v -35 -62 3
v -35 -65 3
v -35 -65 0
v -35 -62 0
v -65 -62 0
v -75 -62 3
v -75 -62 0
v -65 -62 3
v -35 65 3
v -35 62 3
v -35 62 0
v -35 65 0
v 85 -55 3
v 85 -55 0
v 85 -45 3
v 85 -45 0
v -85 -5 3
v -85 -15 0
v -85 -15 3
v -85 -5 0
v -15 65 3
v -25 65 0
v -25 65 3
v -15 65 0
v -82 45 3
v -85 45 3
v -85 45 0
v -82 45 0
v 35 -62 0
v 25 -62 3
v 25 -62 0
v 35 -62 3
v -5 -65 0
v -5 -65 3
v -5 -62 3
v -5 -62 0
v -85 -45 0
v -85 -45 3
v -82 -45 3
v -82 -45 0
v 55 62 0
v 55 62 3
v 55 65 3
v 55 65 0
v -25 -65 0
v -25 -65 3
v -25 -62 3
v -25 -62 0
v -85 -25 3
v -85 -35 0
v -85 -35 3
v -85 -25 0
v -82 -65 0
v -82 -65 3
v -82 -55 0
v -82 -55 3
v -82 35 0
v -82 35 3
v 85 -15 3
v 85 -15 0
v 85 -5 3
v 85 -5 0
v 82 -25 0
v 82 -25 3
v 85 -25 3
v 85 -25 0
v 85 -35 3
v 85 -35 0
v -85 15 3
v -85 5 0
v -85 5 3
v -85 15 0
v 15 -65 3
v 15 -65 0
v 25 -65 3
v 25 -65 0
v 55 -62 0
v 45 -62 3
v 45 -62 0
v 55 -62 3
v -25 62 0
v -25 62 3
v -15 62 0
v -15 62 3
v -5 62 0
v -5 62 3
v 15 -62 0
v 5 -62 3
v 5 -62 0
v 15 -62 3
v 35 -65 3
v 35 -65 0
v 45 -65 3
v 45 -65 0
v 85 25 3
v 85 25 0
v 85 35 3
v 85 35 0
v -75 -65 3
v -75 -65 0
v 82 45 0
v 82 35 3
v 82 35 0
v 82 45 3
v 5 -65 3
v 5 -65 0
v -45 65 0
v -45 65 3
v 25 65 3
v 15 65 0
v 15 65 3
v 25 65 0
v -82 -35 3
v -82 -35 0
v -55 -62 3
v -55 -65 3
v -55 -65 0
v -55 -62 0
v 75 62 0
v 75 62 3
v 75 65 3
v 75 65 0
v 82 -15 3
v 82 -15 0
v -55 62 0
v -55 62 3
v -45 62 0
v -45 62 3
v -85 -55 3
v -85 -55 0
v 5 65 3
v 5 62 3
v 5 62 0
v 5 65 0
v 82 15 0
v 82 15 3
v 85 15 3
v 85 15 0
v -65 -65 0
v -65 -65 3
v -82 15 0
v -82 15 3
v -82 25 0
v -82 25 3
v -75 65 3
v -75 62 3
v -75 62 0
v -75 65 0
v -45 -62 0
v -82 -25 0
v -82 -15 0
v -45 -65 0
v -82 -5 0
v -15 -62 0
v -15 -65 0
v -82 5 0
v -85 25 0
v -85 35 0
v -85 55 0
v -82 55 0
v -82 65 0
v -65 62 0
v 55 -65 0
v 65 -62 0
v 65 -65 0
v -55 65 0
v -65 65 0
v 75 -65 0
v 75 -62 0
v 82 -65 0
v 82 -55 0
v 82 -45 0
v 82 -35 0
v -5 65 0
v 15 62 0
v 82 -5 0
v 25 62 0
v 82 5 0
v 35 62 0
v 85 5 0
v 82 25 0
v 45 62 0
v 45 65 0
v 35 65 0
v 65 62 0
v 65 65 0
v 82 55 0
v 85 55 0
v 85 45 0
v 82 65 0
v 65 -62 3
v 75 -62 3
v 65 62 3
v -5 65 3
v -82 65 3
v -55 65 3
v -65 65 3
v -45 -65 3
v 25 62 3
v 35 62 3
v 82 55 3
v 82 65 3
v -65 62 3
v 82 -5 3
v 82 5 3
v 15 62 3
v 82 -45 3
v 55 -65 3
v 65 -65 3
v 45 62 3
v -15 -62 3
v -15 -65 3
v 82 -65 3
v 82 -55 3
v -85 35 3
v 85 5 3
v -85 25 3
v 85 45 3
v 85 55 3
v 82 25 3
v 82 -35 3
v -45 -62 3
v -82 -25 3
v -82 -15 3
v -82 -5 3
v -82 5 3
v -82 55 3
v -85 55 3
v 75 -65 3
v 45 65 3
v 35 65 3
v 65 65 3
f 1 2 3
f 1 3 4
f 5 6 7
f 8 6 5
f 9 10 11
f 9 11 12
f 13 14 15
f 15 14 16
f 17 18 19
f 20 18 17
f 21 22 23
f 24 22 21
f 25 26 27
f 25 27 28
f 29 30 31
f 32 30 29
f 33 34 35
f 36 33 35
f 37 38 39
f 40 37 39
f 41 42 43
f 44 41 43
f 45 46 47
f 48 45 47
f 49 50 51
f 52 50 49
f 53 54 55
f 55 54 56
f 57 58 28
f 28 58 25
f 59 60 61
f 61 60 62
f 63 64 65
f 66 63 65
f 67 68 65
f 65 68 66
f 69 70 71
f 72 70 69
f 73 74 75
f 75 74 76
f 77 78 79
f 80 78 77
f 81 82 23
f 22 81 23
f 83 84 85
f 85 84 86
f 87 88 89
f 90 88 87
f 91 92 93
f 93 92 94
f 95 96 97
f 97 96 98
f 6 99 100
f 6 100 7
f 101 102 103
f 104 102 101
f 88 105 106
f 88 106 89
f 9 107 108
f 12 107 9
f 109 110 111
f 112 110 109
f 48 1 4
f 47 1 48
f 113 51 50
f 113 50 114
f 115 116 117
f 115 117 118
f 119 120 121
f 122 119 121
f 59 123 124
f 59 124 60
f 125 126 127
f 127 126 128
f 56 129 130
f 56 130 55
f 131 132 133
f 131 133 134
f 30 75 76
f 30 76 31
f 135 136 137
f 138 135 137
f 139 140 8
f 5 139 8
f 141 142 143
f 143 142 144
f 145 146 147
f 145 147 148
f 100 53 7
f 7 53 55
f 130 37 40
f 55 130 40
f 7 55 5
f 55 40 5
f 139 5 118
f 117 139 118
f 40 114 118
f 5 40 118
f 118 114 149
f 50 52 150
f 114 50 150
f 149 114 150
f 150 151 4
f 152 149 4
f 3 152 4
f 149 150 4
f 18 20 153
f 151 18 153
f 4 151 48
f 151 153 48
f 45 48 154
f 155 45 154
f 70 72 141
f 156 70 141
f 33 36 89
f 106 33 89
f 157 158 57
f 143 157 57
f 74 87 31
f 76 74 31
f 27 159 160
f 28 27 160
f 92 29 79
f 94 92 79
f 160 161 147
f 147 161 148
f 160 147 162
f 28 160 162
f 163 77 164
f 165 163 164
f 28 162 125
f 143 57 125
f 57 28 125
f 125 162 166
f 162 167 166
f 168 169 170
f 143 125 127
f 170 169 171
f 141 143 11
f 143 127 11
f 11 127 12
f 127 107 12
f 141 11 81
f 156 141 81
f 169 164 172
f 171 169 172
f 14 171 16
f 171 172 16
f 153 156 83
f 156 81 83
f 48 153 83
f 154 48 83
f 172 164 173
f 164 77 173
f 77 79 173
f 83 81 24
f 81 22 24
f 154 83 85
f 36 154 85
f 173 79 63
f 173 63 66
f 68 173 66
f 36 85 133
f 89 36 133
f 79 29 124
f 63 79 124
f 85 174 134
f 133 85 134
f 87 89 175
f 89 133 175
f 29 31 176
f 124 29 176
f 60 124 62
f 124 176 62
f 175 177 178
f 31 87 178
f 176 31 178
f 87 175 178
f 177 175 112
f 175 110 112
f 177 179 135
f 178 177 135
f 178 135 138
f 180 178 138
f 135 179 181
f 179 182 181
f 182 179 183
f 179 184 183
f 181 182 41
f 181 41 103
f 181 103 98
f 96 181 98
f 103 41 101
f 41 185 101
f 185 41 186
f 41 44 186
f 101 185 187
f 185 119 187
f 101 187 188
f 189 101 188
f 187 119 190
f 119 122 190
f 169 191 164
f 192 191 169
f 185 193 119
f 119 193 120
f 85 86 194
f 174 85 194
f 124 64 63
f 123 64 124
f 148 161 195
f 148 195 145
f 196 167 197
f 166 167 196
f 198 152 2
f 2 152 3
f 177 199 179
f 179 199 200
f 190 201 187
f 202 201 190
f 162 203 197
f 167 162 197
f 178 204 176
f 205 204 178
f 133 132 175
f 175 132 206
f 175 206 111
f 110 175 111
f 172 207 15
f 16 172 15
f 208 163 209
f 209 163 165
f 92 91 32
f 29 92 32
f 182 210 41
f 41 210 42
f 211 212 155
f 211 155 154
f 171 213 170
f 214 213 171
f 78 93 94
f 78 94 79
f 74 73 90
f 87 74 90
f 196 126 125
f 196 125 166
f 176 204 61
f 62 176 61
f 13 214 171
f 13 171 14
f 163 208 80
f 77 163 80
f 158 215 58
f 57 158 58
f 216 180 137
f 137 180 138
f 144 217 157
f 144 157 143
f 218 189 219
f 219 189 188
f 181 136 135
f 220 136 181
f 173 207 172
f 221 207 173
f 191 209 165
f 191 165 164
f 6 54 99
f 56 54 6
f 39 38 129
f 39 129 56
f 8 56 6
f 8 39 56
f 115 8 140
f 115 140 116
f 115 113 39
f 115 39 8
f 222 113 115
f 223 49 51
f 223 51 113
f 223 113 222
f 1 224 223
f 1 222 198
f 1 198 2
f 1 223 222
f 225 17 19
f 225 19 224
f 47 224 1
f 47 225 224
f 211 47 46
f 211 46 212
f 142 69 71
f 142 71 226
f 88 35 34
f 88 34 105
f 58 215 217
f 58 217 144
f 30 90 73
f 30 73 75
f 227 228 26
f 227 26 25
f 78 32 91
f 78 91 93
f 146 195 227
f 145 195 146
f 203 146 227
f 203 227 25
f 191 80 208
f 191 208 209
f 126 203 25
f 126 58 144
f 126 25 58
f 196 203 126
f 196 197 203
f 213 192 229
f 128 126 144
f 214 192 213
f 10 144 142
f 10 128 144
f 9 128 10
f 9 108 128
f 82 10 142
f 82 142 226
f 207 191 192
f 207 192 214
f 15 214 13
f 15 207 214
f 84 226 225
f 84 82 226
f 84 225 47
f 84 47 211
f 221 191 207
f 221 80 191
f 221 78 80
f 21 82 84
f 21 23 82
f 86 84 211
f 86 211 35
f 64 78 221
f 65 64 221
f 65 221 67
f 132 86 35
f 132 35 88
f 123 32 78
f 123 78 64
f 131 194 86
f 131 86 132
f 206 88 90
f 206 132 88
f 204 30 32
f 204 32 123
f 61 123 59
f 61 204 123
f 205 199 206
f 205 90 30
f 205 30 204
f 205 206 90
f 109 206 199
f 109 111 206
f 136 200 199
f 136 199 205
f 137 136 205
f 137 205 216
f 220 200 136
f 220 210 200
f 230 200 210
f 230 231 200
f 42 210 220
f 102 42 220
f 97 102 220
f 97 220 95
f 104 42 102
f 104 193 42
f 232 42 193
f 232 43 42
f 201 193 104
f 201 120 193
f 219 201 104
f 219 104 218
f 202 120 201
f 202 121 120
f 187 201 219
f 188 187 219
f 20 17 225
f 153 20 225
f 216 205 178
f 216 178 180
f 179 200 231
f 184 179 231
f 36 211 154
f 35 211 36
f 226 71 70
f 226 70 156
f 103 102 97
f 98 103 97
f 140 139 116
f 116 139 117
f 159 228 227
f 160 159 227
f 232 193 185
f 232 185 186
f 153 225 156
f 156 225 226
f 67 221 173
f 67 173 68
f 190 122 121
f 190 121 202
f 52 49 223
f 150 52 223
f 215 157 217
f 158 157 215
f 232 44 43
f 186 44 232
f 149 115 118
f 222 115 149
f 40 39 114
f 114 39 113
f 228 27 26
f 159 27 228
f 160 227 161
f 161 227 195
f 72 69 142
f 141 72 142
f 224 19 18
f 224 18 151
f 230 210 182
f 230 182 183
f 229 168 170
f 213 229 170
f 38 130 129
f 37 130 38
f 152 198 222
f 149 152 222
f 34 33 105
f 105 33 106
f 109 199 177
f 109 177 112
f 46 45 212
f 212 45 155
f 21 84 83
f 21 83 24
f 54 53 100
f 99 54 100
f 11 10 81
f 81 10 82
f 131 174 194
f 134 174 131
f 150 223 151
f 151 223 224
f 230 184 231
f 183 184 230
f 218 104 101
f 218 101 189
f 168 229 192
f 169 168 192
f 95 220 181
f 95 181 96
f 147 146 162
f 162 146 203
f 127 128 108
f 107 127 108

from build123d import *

# Parameters (mm, degrees)
F0_W     = 170
F0_H     = 130
F1_DEPTH = 3
F2_W     = 10
F2_H     = 3
F2_W_2   = 3
F2_H_2   = 10
F3_DEPTH = 3.001


with BuildPart() as f1:
    # F0 (on Top) → F1 (new body)
    with BuildSketch(Plane.XY):
        Rectangle(F0_W, F0_H)
    extrude(amount=F1_DEPTH)

    # F2 (on face) → F3 (cut, through all)
    with BuildSketch(Plane.XY.offset(3)):
        with Locations((-70, -63.5)):
            Rectangle(F2_W, F2_H)
        with Locations((-50, -63.5)):
            Rectangle(F2_W, F2_H)
        with Locations((-30, -63.5)):
            Rectangle(F2_W, F2_H)
        with Locations((-10, -63.5)):
            Rectangle(F2_W, F2_H)
        with Locations((10, -63.5)):
            Rectangle(F2_W, F2_H)
        with Locations((30, -63.5)):
            Rectangle(F2_W, F2_H)
        with Locations((50, -63.5)):
            Rectangle(F2_W, F2_H)
        with Locations((70, -63.5)):
            Rectangle(F2_W, F2_H)
        with Locations((-83.5, -60)):
            Rectangle(F2_W_2, F2_H_2)
        with Locations((-83.5, -40)):
            Rectangle(F2_W_2, F2_H_2)
        with Locations((-83.5, -20)):
            Rectangle(F2_W_2, F2_H_2)
        with Locations((-83.5, 0)):
            Rectangle(F2_W_2, F2_H_2)
        with Locations((-83.5, 20)):
            Rectangle(F2_W_2, F2_H_2)
        with Locations((-83.5, 40)):
            Rectangle(F2_W_2, F2_H_2)
        with Locations((-83.5, 60)):
            Rectangle(F2_W_2, F2_H_2)
        with Locations((83.5, -60)):
            Rectangle(F2_W_2, F2_H_2)
        with Locations((83.5, -40)):
            Rectangle(F2_W_2, F2_H_2)
        with Locations((83.5, 20)):
            Rectangle(F2_W_2, F2_H_2)
        with Locations((83.5, 60)):
            Rectangle(F2_W_2, F2_H_2)
        with Locations((83.5, 0)):
            Rectangle(F2_W_2, F2_H_2)
        with Locations((83.5, -20)):
            Rectangle(F2_W_2, F2_H_2)
        with Locations((83.5, 40)):
            Rectangle(F2_W_2, F2_H_2)
        with Locations((10, 63.5)):
            Rectangle(F2_W, F2_H)
        with Locations((-70, 63.5)):
            Rectangle(F2_W, F2_H)
        with Locations((50, 63.5)):
            Rectangle(F2_W, F2_H)
        with Locations((70, 63.5)):
            Rectangle(F2_W, F2_H)
        with Locations((-30, 63.5)):
            Rectangle(F2_W, F2_H)
        with Locations((-50, 63.5)):
            Rectangle(F2_W, F2_H)
        with Locations((30, 63.5)):
            Rectangle(F2_W, F2_H)
        with Locations((-10, 63.5)):
            Rectangle(F2_W, F2_H)
    extrude(amount=-F3_DEPTH, mode=Mode.SUBTRACT)


solid = f1.part
